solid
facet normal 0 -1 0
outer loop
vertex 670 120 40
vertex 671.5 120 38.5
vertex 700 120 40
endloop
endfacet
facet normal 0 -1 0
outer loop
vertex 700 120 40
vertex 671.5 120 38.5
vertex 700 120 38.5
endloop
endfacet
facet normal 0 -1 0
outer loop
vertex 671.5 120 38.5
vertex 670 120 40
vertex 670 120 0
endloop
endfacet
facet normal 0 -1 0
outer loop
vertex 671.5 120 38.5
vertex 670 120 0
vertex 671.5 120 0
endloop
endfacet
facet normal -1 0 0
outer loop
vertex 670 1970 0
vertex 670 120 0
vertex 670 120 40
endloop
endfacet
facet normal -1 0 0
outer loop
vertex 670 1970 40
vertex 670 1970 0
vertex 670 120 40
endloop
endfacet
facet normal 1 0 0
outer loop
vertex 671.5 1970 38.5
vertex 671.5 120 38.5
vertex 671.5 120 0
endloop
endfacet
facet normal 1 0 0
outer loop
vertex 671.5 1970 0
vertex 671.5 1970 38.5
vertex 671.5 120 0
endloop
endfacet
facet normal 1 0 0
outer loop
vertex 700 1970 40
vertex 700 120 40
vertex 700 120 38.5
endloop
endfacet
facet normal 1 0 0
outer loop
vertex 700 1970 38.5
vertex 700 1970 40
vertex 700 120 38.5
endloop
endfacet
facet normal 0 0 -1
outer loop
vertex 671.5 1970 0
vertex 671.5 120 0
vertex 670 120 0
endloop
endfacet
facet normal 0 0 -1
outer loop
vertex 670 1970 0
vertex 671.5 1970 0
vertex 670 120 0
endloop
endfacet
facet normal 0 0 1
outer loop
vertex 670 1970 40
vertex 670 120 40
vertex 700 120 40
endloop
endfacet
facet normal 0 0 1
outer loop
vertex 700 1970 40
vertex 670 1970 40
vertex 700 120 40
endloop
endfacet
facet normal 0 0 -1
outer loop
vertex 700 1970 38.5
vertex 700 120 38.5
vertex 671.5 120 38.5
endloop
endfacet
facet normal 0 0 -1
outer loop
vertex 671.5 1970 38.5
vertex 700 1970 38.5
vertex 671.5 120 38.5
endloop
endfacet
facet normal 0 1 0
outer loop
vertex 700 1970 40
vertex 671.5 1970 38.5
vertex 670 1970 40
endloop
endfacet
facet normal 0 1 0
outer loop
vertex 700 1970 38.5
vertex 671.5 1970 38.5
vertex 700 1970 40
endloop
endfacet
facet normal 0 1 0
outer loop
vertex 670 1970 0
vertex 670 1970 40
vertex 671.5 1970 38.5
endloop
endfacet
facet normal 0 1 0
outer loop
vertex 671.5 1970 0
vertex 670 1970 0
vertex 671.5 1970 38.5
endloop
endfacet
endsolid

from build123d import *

# Parameters (mm, degrees)
PRESS_SOVE_SAG_1_START = 120
PRESS_SOVE_SAG_1_DEPTH = 1850


with BuildPart() as part:
    # Sketch1 → PRESS_sove_sag_1 (new body)
    with BuildSketch(Plane(origin=(0, 0, 0), x_dir=(1, 0, 0), z_dir=(0, 1, 0)).offset(PRESS_SOVE_SAG_1_START)):
        Polygon((700, -40), (700, -38.5), (671.5, -38.5), (671.5, 0), (670, 0), (670, -40), align=None)
    extrude(amount=PRESS_SOVE_SAG_1_DEPTH)


solid = part.part
